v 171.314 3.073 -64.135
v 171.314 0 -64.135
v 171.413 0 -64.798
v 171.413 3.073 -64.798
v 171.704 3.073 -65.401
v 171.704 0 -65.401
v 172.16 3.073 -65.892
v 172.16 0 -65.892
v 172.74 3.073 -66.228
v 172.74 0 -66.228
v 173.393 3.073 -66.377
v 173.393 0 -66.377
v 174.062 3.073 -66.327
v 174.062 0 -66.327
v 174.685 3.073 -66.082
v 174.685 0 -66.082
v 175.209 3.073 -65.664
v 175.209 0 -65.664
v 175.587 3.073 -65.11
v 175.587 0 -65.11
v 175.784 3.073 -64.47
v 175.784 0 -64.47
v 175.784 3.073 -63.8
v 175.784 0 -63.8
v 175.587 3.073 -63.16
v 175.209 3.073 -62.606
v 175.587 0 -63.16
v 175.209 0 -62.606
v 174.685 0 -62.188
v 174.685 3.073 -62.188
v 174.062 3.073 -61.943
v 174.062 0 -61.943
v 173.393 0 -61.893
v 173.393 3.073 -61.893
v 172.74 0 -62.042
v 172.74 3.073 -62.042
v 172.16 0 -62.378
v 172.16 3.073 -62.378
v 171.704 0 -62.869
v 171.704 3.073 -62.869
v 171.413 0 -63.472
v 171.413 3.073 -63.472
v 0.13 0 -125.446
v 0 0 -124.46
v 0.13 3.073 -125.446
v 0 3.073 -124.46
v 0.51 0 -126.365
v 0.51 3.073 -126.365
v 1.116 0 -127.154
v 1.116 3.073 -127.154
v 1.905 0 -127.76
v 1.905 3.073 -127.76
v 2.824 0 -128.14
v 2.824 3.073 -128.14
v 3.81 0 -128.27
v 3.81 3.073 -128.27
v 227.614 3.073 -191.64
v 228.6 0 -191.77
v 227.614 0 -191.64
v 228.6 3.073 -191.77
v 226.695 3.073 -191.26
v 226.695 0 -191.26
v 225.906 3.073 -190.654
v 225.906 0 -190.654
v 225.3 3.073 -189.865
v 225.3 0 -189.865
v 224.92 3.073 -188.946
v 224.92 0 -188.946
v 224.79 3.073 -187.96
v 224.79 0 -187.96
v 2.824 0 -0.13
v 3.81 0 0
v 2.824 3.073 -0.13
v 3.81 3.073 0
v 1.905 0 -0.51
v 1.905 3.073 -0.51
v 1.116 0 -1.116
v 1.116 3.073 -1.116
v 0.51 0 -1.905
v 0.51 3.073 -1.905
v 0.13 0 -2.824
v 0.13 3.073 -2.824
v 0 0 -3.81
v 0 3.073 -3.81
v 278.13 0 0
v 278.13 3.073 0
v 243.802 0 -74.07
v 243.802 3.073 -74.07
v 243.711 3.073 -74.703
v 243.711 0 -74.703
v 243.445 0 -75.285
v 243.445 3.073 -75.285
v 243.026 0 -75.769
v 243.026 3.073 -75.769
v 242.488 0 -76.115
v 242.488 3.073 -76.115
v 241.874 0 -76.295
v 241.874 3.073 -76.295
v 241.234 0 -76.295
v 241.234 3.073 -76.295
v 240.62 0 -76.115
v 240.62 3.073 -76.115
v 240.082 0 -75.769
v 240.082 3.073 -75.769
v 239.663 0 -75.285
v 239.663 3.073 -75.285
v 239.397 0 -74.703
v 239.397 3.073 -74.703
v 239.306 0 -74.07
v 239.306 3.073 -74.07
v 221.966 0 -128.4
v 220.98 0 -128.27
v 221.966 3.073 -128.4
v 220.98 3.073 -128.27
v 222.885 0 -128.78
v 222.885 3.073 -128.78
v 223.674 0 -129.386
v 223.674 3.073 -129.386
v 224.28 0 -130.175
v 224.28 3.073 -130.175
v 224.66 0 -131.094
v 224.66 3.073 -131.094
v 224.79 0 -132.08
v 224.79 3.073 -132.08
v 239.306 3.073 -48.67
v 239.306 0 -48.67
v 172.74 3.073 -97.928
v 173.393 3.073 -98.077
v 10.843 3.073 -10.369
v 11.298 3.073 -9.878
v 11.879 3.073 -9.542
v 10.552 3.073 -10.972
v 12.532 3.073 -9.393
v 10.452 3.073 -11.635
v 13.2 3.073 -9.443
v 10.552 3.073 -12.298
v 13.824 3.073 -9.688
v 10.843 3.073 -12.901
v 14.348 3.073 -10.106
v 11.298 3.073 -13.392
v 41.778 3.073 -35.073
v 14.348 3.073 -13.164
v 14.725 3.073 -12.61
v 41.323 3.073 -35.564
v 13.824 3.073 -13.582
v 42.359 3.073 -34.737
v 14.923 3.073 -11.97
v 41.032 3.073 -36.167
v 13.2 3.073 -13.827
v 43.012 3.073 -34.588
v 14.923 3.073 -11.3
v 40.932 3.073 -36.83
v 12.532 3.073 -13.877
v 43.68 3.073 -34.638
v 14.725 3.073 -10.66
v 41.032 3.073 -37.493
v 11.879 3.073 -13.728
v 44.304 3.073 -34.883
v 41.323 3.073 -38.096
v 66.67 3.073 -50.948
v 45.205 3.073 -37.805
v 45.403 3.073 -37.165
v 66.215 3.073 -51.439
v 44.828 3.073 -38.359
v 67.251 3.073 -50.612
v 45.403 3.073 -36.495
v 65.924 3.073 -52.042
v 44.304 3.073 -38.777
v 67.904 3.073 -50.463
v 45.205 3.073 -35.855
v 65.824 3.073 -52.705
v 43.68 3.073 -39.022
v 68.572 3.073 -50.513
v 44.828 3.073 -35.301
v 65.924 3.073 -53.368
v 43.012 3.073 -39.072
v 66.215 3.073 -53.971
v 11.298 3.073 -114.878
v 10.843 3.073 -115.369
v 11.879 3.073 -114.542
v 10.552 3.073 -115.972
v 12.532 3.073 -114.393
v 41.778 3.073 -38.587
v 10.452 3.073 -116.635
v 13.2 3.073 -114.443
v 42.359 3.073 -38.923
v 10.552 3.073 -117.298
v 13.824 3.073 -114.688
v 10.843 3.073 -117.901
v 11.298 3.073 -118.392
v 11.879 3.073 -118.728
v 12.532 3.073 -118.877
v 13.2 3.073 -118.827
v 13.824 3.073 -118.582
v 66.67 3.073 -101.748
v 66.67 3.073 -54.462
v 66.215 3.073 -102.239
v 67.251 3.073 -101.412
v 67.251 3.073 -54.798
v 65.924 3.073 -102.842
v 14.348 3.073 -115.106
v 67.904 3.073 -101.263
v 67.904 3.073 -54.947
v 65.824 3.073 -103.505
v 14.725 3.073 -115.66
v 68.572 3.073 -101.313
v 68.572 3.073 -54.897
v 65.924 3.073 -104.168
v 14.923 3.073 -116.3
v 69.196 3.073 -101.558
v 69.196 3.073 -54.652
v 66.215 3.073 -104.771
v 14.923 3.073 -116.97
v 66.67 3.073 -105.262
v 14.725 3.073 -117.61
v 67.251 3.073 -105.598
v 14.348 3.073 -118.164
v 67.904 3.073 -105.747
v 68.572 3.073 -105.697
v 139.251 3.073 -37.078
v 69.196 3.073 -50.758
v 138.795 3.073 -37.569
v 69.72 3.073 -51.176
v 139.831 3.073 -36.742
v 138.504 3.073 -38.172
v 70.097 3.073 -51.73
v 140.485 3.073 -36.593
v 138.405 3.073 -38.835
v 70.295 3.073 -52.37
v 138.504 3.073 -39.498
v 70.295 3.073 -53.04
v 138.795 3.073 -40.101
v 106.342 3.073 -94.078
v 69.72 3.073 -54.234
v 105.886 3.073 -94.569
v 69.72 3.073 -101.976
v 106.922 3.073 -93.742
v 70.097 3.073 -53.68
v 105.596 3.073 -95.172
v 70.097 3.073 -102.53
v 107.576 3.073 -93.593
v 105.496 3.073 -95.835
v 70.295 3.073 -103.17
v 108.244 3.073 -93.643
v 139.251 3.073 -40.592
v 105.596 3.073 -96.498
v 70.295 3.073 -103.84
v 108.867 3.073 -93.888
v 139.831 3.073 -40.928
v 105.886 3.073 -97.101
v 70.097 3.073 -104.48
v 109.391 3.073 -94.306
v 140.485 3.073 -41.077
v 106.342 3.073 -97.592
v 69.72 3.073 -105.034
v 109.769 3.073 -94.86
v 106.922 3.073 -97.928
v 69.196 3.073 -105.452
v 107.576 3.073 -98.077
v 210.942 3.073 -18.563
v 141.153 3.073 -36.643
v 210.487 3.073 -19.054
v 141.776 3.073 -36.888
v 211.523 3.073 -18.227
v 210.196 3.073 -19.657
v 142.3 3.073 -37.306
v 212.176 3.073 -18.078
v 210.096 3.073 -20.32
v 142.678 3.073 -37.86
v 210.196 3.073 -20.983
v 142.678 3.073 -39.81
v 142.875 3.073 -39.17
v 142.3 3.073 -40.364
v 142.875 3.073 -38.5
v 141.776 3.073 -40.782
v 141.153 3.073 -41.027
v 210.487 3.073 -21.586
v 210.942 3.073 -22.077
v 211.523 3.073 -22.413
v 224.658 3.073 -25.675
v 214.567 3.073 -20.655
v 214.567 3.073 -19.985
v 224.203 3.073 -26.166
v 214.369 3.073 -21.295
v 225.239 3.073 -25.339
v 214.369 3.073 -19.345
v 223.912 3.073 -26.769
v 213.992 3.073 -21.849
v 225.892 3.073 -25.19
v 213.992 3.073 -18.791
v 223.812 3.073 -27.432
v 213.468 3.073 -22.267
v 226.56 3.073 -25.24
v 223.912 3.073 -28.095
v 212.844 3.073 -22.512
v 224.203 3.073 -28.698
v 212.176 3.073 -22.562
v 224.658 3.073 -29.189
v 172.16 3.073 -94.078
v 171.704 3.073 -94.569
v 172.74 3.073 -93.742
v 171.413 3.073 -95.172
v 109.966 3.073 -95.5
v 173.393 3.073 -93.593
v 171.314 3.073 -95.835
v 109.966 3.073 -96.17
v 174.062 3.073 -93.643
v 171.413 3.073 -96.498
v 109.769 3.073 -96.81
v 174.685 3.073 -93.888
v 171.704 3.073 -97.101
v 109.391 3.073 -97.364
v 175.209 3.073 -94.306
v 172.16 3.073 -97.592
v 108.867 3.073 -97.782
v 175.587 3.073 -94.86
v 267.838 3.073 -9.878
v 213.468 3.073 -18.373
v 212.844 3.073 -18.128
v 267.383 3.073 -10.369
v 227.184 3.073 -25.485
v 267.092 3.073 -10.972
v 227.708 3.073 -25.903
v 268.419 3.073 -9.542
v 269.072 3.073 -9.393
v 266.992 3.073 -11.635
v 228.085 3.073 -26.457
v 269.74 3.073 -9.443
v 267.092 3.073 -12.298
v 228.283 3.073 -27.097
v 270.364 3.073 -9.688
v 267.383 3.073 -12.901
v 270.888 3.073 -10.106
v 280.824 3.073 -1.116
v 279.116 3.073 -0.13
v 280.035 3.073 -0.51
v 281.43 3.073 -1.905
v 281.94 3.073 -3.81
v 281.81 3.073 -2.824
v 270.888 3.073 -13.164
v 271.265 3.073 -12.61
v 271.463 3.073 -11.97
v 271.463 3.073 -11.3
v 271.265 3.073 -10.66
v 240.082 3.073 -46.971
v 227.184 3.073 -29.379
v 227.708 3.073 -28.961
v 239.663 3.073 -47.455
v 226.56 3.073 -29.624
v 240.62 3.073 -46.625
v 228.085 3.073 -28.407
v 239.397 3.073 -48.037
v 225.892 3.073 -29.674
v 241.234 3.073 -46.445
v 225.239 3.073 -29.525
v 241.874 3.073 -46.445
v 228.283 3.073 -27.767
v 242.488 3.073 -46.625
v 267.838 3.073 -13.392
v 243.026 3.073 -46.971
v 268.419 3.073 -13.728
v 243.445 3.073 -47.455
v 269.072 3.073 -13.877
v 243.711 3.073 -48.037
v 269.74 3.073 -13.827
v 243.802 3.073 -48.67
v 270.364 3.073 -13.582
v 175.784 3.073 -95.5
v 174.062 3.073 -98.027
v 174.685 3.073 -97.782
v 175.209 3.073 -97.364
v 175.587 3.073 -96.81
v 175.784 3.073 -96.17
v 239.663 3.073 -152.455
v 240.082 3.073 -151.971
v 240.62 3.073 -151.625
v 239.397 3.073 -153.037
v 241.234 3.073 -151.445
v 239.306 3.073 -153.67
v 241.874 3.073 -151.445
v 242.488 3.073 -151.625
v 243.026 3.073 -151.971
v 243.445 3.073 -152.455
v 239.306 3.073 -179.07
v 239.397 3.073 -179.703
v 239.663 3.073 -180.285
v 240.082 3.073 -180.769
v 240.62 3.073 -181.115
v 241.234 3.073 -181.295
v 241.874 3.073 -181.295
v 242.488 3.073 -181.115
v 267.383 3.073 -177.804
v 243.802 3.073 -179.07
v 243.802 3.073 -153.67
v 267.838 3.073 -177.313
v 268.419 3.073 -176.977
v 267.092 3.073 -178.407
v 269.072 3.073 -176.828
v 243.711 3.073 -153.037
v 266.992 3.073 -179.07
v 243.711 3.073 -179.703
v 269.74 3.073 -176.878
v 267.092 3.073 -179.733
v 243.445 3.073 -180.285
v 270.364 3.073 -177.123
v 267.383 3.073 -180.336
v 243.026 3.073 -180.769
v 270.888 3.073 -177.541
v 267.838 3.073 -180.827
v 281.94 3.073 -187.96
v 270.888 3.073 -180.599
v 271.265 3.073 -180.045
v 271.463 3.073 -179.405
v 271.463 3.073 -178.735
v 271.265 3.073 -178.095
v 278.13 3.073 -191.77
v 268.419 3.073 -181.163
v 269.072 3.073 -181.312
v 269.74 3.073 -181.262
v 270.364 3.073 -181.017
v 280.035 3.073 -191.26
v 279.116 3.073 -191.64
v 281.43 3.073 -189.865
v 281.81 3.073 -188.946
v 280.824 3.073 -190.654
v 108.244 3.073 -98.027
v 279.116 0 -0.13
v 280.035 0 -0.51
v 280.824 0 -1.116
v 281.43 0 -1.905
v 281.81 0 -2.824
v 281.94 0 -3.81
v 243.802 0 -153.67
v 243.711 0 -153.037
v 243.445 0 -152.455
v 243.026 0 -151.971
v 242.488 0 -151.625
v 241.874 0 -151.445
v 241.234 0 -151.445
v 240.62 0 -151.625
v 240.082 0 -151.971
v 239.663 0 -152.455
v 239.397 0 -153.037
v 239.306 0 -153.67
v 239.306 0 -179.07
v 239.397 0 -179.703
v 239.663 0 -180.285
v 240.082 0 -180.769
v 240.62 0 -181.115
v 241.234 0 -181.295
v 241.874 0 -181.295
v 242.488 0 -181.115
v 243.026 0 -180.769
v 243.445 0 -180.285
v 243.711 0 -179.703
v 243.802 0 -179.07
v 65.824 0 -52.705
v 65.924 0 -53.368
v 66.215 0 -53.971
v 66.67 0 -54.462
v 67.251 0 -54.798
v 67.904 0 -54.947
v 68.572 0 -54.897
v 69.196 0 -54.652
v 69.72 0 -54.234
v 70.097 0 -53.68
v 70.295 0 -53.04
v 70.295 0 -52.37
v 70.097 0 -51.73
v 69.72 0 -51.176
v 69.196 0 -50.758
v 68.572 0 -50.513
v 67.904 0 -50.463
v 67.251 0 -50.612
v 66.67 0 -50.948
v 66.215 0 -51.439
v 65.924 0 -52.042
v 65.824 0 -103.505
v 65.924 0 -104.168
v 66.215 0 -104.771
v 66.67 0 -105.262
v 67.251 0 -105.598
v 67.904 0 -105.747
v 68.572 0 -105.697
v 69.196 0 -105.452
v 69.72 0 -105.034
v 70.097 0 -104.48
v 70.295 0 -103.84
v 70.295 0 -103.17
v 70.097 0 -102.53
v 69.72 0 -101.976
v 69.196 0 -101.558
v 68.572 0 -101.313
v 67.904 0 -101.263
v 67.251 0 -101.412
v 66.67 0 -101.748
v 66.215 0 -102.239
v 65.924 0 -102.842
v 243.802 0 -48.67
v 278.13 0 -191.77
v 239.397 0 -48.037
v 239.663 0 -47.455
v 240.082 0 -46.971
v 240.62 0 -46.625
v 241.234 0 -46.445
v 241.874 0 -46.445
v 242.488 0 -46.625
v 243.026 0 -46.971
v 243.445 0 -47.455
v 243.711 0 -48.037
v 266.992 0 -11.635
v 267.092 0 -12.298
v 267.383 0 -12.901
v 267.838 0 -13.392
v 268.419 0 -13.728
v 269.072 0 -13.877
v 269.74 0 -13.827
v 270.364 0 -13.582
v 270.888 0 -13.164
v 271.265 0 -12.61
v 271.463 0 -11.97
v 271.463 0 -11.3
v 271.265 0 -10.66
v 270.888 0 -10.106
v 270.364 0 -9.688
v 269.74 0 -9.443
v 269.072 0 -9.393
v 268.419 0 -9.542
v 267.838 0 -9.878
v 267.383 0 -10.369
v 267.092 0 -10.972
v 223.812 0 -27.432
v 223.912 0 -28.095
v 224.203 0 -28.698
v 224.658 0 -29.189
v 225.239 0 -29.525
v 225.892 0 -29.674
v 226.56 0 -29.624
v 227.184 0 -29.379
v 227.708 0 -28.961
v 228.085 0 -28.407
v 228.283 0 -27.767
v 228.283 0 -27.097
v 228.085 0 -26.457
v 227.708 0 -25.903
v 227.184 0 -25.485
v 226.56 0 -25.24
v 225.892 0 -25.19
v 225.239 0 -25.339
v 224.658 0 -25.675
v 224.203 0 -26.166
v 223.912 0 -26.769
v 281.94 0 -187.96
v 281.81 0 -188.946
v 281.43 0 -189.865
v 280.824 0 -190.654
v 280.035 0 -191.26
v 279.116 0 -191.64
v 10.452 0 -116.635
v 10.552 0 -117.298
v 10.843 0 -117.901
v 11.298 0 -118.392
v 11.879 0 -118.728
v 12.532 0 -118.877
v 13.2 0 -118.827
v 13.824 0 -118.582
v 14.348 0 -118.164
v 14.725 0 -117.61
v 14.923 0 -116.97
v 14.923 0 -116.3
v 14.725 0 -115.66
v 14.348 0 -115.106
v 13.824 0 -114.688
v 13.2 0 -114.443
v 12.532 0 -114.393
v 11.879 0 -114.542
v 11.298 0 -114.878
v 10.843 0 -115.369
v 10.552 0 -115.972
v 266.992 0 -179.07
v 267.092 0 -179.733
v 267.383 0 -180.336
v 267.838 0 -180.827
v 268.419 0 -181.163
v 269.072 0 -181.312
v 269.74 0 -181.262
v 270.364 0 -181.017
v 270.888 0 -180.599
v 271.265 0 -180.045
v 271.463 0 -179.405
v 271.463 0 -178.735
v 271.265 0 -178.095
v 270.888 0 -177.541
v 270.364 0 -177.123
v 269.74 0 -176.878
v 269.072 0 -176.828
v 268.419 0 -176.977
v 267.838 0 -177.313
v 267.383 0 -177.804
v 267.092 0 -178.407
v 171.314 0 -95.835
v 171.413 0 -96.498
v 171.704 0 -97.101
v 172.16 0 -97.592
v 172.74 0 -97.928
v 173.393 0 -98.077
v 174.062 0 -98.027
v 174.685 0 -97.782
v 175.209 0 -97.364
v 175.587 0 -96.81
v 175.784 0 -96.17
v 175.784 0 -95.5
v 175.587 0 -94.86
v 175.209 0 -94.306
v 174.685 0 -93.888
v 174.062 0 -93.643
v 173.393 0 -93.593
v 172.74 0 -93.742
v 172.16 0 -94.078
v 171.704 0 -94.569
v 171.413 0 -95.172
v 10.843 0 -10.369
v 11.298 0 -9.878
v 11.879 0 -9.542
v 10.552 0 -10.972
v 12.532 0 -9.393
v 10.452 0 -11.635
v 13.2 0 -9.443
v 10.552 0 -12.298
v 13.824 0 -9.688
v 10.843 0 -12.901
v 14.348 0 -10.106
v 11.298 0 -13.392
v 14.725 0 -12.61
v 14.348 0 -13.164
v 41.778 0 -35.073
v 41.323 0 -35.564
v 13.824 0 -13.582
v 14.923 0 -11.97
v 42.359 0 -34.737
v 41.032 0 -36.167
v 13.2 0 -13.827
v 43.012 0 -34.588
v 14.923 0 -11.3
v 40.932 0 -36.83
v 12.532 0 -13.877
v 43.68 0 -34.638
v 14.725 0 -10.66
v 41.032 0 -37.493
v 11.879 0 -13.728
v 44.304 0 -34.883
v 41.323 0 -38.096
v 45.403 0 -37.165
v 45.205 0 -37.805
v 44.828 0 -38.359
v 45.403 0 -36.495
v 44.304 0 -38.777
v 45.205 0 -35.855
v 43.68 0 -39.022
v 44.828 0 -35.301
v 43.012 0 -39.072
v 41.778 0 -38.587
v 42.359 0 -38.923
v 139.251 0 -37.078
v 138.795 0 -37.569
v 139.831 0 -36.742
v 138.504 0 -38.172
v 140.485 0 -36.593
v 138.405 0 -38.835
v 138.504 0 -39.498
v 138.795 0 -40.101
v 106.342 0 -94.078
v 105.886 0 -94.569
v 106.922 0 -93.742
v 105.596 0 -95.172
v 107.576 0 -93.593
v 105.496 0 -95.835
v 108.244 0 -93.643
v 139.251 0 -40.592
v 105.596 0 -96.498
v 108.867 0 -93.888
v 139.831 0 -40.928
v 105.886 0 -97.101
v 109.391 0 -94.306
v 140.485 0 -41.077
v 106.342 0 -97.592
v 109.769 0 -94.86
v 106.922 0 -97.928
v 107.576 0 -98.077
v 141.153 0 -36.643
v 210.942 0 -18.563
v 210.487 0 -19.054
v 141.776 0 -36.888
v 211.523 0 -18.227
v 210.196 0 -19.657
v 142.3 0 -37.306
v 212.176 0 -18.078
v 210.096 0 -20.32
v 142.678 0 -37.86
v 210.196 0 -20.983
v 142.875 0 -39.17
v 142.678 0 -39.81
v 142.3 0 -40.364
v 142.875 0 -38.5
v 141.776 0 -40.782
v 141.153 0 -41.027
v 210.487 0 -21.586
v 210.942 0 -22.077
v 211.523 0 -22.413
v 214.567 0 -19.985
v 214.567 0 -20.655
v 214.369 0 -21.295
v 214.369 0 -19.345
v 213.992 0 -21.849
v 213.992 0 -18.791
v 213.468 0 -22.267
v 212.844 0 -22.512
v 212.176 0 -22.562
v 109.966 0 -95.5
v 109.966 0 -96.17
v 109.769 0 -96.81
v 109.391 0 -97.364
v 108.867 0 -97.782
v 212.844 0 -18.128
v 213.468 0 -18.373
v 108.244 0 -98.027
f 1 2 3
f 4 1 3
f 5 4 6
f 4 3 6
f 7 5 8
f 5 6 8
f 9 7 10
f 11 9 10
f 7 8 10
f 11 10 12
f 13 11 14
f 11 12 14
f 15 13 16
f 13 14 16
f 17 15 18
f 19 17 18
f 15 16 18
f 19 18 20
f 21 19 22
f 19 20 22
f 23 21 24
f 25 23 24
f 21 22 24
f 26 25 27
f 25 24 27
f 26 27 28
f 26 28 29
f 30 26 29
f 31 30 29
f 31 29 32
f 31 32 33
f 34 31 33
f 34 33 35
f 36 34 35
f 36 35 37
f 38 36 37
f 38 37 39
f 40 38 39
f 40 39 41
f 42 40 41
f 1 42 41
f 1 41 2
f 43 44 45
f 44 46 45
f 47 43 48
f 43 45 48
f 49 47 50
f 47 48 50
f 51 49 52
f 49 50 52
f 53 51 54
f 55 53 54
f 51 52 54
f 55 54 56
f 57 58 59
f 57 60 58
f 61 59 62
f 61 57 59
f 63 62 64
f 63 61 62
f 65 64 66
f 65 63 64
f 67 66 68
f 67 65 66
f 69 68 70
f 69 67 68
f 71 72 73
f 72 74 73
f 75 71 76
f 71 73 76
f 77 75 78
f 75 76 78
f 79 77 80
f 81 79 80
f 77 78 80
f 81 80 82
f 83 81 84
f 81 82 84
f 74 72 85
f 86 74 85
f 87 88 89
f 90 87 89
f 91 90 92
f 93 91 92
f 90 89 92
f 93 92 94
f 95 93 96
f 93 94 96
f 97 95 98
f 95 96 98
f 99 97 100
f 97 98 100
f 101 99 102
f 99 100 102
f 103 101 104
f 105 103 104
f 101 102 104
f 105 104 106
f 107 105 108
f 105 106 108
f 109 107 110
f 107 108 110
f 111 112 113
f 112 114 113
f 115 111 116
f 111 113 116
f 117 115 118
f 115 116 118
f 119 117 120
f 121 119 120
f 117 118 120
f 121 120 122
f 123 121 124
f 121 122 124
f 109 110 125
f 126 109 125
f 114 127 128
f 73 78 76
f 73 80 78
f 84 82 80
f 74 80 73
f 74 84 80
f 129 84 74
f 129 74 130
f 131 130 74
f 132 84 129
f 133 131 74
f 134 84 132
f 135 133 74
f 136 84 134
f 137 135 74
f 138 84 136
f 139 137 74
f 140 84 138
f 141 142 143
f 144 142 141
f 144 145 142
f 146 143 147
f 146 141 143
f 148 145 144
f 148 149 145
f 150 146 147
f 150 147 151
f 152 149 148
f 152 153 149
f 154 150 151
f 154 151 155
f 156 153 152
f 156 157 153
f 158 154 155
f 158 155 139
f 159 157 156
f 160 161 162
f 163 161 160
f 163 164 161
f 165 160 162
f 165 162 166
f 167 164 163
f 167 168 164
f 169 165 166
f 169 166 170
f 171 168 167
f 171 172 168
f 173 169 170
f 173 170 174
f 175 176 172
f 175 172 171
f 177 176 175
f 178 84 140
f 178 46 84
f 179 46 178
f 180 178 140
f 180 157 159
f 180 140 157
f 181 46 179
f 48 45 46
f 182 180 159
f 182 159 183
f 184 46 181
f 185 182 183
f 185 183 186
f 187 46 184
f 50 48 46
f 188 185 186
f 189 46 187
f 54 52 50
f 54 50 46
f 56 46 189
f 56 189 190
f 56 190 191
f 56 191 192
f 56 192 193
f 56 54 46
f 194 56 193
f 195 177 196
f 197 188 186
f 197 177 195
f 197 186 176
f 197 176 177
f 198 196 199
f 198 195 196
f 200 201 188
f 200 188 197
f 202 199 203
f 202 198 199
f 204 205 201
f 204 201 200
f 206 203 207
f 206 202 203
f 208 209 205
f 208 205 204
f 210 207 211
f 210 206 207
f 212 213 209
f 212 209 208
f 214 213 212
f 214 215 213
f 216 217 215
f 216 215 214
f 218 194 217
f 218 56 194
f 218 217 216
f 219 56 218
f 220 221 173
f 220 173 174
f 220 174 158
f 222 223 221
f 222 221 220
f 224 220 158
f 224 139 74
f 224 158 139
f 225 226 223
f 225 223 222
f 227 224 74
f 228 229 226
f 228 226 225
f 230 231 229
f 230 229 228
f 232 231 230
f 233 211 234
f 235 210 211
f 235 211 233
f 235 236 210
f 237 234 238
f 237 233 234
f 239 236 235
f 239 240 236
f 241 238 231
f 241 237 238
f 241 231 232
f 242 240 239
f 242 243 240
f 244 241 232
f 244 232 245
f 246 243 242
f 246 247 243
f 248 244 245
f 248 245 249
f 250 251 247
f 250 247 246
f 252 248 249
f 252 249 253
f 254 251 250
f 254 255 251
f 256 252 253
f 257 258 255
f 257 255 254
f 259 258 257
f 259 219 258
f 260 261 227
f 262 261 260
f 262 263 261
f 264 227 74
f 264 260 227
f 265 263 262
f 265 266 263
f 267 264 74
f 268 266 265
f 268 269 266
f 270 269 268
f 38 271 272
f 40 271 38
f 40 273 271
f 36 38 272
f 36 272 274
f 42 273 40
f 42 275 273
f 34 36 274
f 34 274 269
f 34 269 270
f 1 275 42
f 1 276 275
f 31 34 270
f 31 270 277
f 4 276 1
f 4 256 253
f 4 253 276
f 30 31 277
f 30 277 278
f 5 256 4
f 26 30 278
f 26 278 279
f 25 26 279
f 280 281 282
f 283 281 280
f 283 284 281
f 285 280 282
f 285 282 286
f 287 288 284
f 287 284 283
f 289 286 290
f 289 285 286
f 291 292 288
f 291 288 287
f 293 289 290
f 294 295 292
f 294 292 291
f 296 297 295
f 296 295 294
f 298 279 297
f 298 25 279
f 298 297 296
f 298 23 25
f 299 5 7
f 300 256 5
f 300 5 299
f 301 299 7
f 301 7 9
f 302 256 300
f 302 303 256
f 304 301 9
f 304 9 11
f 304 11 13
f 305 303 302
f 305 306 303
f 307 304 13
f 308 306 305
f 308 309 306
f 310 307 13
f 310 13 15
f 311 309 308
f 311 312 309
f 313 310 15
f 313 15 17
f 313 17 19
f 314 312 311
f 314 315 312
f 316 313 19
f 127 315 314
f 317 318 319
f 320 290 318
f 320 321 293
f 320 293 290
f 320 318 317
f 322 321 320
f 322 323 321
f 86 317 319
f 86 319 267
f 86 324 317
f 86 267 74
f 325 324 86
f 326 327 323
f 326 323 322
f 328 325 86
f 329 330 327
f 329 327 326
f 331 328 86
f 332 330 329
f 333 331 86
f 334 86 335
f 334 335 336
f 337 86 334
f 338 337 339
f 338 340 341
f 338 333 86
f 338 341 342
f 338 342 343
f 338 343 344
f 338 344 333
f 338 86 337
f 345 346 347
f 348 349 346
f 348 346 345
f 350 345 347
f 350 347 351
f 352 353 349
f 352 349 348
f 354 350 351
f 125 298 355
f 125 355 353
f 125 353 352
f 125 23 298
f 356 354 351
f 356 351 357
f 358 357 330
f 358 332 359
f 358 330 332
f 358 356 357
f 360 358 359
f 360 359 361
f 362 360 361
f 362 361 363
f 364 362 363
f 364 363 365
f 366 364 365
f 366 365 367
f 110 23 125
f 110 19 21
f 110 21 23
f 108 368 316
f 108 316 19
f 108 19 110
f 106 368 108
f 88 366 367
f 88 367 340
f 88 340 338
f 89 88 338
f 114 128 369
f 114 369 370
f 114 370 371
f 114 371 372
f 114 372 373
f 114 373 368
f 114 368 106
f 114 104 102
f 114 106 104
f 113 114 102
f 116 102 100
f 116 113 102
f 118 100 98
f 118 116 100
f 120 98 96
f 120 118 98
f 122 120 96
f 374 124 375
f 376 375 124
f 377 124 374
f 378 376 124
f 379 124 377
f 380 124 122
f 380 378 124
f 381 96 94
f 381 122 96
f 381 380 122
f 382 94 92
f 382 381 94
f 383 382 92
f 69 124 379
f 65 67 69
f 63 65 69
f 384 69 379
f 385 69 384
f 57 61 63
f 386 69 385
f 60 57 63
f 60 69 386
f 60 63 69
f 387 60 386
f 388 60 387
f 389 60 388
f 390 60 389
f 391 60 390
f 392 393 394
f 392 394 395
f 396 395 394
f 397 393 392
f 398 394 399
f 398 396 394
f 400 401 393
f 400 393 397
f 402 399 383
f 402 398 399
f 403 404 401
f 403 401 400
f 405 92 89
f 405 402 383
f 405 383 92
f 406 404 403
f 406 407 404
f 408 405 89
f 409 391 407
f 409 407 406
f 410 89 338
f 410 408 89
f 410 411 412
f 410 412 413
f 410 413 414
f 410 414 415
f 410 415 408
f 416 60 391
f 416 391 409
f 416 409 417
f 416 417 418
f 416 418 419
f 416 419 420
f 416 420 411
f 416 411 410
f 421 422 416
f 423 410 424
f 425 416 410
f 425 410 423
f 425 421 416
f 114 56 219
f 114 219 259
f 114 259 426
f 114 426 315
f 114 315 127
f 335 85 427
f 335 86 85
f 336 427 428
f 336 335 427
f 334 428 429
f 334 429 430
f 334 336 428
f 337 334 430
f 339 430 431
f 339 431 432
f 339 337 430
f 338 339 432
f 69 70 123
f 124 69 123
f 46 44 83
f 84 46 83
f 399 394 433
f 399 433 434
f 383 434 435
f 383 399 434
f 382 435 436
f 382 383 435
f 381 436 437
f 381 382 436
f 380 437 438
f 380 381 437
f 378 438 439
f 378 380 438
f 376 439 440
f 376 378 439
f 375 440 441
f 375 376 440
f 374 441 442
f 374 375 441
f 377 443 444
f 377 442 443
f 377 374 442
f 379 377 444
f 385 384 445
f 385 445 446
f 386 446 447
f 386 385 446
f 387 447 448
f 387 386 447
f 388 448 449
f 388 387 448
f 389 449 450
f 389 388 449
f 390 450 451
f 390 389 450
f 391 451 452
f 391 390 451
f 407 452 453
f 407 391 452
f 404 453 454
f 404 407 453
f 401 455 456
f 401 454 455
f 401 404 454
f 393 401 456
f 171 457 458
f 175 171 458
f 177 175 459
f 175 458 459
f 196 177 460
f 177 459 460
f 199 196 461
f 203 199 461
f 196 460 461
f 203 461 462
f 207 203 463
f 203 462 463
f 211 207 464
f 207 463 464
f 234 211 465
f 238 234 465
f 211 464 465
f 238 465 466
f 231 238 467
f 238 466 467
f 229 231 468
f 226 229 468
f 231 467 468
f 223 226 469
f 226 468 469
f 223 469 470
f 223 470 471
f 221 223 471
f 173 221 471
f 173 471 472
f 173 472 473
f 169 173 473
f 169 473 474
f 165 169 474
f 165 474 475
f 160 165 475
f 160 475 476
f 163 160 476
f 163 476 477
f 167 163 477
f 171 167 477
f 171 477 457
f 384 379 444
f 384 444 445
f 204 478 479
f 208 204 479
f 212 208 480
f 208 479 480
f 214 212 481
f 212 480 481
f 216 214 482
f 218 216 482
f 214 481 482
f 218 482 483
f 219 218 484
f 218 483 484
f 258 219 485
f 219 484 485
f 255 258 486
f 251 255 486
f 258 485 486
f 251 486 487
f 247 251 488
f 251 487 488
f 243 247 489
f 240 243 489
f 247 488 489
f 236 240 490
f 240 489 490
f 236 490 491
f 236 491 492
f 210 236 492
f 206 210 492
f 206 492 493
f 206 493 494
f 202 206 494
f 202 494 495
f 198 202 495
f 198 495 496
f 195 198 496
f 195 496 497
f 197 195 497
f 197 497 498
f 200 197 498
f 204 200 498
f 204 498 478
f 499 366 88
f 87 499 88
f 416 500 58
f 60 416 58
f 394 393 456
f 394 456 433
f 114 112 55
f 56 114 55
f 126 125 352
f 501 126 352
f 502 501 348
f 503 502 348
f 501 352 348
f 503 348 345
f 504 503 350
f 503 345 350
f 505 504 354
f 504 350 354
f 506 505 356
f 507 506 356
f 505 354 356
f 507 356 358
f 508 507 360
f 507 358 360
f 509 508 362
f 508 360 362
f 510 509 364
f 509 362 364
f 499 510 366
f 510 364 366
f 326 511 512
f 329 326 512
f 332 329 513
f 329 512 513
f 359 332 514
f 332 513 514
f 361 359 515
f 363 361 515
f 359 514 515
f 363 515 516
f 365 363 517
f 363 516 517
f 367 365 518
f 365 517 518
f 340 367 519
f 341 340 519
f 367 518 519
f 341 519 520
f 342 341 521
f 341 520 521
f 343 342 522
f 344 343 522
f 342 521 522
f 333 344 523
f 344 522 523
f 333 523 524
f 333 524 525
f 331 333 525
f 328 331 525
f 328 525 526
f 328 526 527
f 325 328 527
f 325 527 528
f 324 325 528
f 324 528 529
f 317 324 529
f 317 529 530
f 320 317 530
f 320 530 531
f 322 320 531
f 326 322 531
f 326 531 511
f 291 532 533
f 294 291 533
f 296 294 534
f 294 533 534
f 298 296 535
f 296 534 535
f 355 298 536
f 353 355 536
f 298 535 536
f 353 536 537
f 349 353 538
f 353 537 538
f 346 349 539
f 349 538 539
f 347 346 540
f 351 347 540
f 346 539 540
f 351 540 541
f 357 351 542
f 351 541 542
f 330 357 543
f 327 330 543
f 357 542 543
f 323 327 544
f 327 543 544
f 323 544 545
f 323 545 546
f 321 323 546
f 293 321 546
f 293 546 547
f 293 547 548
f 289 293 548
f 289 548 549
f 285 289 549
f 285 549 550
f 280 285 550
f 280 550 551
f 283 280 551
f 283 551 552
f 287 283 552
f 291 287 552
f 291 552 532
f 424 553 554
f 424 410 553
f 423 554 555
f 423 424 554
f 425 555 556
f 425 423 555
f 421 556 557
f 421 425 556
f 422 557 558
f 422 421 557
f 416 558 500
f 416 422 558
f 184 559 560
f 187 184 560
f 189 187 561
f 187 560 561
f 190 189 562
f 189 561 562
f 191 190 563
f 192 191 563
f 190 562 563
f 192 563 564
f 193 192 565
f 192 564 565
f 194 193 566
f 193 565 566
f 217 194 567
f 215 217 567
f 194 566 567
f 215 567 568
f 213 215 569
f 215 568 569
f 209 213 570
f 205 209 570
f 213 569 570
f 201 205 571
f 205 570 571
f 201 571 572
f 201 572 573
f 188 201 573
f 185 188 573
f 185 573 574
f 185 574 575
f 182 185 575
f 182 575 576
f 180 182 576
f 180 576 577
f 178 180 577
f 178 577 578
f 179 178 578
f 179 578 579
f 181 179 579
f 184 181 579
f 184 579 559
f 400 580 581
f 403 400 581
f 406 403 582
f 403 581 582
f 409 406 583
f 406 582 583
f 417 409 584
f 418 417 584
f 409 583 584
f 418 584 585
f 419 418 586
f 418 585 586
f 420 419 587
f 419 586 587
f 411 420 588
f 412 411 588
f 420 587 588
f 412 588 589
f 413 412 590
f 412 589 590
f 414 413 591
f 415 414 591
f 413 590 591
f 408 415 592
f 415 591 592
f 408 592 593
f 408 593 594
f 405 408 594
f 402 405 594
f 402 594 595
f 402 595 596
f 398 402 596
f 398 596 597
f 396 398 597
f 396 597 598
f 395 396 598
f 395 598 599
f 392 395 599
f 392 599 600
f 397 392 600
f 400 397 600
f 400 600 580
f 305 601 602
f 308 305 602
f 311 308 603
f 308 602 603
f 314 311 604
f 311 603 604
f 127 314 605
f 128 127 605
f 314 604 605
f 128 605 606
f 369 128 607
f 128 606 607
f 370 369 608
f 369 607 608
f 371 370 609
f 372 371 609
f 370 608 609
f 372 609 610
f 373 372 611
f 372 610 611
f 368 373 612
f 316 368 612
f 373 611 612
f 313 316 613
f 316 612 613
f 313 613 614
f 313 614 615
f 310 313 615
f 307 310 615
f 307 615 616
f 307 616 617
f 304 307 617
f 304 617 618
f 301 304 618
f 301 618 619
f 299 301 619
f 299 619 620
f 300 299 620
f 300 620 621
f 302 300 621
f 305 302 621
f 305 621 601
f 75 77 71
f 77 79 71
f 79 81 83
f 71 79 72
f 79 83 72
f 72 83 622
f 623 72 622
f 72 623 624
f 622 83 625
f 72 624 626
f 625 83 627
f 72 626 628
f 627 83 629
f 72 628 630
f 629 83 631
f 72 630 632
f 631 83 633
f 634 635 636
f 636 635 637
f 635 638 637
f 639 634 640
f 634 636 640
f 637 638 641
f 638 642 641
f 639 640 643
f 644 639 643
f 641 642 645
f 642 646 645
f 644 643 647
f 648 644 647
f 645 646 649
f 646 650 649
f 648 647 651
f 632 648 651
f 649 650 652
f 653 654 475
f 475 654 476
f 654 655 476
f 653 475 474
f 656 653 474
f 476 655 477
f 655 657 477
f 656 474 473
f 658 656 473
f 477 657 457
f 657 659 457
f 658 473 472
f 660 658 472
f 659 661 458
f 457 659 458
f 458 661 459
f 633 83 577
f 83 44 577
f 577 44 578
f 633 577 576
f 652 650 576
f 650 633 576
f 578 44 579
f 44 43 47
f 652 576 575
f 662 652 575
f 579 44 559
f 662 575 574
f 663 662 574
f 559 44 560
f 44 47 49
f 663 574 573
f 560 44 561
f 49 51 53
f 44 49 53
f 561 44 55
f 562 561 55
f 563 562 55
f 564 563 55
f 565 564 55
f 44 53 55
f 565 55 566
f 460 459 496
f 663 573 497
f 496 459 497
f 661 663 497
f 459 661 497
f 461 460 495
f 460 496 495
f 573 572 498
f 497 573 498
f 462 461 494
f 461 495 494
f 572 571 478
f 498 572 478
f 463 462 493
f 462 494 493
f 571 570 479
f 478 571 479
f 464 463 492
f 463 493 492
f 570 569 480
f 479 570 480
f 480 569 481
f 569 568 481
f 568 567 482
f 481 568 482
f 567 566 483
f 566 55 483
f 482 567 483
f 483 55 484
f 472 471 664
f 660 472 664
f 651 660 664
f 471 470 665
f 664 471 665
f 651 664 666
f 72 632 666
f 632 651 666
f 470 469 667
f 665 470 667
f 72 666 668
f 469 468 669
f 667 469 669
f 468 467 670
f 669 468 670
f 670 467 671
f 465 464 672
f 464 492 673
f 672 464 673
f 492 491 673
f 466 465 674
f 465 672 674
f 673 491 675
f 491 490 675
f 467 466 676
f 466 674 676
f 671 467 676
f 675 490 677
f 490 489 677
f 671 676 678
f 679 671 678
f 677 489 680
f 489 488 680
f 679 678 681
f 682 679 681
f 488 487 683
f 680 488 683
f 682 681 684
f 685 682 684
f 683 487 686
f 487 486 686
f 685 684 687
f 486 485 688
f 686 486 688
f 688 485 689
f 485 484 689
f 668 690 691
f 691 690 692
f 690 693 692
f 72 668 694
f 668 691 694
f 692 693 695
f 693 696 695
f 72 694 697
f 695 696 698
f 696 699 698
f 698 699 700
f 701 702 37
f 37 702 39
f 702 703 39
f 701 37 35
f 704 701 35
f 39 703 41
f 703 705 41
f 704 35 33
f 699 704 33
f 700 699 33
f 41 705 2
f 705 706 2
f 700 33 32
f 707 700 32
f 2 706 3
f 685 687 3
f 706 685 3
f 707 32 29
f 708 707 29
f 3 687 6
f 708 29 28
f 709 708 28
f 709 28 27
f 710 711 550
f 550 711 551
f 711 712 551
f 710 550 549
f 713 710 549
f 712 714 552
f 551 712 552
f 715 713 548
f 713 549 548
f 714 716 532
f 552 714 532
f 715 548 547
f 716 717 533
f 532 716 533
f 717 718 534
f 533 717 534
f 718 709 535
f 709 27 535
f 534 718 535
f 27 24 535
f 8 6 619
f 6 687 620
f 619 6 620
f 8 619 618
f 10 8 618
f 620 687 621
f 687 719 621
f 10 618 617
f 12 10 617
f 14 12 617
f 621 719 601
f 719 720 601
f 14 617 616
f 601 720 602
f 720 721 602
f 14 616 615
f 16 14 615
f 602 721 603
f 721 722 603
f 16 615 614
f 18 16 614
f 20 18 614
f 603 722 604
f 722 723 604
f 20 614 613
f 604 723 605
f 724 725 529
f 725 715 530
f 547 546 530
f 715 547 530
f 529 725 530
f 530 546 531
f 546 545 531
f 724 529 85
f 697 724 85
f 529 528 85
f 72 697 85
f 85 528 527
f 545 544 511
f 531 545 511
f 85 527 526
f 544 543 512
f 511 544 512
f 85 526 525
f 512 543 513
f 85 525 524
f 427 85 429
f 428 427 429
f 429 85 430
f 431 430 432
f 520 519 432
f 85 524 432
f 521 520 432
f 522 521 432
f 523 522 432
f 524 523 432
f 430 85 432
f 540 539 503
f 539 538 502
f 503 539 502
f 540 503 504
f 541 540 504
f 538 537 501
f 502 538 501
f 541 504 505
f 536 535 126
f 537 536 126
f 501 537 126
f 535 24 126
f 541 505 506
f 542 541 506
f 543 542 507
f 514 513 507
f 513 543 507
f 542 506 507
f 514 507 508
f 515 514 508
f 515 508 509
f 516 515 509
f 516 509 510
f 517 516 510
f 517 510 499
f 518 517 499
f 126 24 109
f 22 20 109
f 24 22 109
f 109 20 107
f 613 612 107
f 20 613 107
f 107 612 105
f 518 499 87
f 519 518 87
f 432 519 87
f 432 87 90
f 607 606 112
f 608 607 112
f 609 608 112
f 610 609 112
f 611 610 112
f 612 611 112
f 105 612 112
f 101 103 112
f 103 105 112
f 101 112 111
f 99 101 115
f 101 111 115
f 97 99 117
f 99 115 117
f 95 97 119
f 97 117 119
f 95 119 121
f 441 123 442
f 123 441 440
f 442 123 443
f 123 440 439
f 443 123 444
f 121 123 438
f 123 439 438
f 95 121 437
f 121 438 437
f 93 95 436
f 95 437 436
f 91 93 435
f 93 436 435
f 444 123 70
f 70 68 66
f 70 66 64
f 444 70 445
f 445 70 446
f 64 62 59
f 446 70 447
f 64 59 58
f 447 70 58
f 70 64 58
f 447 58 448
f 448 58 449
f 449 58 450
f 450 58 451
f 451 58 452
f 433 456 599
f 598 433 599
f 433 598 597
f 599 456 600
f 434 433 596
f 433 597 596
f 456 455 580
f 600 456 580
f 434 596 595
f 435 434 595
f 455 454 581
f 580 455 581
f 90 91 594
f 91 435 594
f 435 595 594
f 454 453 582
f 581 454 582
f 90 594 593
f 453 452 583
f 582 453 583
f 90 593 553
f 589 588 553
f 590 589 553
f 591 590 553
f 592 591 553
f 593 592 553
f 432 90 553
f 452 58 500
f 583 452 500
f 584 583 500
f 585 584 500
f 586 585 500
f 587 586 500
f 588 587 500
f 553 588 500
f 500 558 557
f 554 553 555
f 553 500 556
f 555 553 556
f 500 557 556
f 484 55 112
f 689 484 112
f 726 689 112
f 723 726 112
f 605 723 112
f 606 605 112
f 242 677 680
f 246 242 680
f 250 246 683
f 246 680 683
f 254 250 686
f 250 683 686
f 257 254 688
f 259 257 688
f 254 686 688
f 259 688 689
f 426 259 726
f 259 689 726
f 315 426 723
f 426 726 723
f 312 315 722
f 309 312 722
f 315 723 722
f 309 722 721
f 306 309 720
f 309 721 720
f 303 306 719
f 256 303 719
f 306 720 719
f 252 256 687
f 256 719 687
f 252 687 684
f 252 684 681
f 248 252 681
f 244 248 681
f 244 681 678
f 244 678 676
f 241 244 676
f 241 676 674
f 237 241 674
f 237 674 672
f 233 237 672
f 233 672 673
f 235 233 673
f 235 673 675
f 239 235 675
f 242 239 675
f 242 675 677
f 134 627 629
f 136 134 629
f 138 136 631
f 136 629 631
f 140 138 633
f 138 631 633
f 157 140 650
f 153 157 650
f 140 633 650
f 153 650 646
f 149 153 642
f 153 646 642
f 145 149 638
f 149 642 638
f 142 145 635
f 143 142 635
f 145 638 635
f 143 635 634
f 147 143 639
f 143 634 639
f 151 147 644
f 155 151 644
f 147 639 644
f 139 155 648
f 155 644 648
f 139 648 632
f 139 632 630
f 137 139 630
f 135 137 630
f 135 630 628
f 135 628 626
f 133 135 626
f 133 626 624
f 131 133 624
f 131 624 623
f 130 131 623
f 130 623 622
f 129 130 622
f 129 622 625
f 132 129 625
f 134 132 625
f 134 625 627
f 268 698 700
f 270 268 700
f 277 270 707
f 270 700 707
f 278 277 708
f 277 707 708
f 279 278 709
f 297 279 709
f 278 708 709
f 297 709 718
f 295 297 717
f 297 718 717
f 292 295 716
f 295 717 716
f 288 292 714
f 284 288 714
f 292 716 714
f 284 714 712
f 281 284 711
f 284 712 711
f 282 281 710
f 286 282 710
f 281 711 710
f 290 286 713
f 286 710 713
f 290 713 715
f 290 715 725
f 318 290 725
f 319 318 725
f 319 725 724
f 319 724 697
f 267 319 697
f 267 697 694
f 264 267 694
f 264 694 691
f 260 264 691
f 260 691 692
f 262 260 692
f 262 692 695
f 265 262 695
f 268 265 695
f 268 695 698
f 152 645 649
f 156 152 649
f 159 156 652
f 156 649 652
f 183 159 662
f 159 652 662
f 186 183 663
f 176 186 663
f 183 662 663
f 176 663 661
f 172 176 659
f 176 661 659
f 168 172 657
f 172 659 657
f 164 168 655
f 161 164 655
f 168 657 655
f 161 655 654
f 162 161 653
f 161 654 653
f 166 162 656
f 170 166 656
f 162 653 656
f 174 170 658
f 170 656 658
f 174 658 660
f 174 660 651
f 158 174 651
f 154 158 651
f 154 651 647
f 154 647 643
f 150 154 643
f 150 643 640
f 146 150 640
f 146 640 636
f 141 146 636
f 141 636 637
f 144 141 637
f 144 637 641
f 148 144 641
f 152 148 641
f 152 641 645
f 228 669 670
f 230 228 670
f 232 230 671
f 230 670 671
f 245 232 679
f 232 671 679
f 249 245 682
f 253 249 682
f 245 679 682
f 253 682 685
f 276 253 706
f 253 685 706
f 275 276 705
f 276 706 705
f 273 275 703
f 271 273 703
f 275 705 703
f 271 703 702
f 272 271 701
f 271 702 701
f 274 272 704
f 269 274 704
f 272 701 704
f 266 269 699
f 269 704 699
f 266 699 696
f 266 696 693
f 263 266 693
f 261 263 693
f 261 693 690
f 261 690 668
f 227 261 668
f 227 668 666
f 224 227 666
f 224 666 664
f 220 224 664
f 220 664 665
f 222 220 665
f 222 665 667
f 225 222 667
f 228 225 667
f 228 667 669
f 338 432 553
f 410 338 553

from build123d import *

# Parameters (mm, degrees)
BOSS_EXTRUDE1_DEPTH   = 3.0734
COMPRESSOR_MOUNTS_D   = 4.4958
F_8_CLEARANCE_HOLE2_D = 4.4958
FILLET1_R             = 3.81
CUT_EXTRUDE1_DEPTH    = 4.0734


with BuildPart() as part:
    # Sketch1 → Boss-Extrude1 (new body)
    with BuildSketch(Plane(origin=(0, 0, 0), x_dir=(1, 0, 0), z_dir=(0, 1, 0))):
        Polygon((0, 0), (281.94, 0), (281.94, 191.77), (224.79, 191.77), (224.79, 128.27), (0, 128.27), align=None)
    extrude(amount=BOSS_EXTRUDE1_DEPTH)

    # Compressor Mounts (through all)
    with Locations(Plane(origin=(0, 3.0734, 0), x_dir=(1, 0, 0), z_dir=(0, 1, 0))):
        with Locations((140.6525, 38.835), (107.743534656, 95.835), (173.561465344, 95.835)):
            Hole(COMPRESSOR_MOUNTS_D / 2)

    # #8 Clearance Hole2 (through all)
    with Locations(Plane(origin=(0, 3.0734, 0), x_dir=(1, 0, 0), z_dir=(0, 1, 0))):
        with Locations((12.7, 11.635), (269.24, 11.635), (269.24, 179.07), (12.7, 116.635), (173.561465344, 64.135), (140.6525, 38.835), (107.743534656, 95.835), (173.561465344, 95.835), (212.344, 20.32), (68.072, 103.505), (68.072, 52.705), (43.18, 36.83), (226.06, 27.432)):
            Hole(F_8_CLEARANCE_HOLE2_D / 2)

    # Fillet1
    fillet1_edges = [part.edges().sort_by_distance(p)[0] for p in [
        (0, 1.5367, -128.27),
        (224.79, 1.5367, -128.27),
        (224.79, 1.5367, -191.77),
        (281.94, 1.5367, -191.77),
        (281.94, 1.5367, 0),
        (0, 1.5367, 0),
    ]]
    fillet(fillet1_edges, radius=FILLET1_R)

    # Sketch7 → Cut-Extrude1 (cut, through all)
    with BuildSketch(Plane(origin=(0, 3.0734, 0), x_dir=(1, 0, 0), z_dir=(0, 1, 0))):
        with BuildLine():
            Line((243.8019, 179.07), (243.8019, 153.67))
            ThreePointArc((243.8019, 153.67), (241.554, 151.4221), (239.3061, 153.67))
            Line((239.3061, 153.67), (239.3061, 179.07))
            ThreePointArc((239.3061, 179.07), (241.554, 181.3179), (243.8019, 179.07))
        make_face()
        with BuildLine():
            Line((243.8019, 48.67), (243.8019, 74.07))
            ThreePointArc((243.8019, 74.07), (241.554, 76.3179), (239.3061, 74.07))
            Line((239.3061, 74.07), (239.3061, 48.67))
            ThreePointArc((239.3061, 48.67), (241.554, 46.4221), (243.8019, 48.67))
        make_face()
    extrude(amount=-CUT_EXTRUDE1_DEPTH, mode=Mode.SUBTRACT)


solid = part.part
